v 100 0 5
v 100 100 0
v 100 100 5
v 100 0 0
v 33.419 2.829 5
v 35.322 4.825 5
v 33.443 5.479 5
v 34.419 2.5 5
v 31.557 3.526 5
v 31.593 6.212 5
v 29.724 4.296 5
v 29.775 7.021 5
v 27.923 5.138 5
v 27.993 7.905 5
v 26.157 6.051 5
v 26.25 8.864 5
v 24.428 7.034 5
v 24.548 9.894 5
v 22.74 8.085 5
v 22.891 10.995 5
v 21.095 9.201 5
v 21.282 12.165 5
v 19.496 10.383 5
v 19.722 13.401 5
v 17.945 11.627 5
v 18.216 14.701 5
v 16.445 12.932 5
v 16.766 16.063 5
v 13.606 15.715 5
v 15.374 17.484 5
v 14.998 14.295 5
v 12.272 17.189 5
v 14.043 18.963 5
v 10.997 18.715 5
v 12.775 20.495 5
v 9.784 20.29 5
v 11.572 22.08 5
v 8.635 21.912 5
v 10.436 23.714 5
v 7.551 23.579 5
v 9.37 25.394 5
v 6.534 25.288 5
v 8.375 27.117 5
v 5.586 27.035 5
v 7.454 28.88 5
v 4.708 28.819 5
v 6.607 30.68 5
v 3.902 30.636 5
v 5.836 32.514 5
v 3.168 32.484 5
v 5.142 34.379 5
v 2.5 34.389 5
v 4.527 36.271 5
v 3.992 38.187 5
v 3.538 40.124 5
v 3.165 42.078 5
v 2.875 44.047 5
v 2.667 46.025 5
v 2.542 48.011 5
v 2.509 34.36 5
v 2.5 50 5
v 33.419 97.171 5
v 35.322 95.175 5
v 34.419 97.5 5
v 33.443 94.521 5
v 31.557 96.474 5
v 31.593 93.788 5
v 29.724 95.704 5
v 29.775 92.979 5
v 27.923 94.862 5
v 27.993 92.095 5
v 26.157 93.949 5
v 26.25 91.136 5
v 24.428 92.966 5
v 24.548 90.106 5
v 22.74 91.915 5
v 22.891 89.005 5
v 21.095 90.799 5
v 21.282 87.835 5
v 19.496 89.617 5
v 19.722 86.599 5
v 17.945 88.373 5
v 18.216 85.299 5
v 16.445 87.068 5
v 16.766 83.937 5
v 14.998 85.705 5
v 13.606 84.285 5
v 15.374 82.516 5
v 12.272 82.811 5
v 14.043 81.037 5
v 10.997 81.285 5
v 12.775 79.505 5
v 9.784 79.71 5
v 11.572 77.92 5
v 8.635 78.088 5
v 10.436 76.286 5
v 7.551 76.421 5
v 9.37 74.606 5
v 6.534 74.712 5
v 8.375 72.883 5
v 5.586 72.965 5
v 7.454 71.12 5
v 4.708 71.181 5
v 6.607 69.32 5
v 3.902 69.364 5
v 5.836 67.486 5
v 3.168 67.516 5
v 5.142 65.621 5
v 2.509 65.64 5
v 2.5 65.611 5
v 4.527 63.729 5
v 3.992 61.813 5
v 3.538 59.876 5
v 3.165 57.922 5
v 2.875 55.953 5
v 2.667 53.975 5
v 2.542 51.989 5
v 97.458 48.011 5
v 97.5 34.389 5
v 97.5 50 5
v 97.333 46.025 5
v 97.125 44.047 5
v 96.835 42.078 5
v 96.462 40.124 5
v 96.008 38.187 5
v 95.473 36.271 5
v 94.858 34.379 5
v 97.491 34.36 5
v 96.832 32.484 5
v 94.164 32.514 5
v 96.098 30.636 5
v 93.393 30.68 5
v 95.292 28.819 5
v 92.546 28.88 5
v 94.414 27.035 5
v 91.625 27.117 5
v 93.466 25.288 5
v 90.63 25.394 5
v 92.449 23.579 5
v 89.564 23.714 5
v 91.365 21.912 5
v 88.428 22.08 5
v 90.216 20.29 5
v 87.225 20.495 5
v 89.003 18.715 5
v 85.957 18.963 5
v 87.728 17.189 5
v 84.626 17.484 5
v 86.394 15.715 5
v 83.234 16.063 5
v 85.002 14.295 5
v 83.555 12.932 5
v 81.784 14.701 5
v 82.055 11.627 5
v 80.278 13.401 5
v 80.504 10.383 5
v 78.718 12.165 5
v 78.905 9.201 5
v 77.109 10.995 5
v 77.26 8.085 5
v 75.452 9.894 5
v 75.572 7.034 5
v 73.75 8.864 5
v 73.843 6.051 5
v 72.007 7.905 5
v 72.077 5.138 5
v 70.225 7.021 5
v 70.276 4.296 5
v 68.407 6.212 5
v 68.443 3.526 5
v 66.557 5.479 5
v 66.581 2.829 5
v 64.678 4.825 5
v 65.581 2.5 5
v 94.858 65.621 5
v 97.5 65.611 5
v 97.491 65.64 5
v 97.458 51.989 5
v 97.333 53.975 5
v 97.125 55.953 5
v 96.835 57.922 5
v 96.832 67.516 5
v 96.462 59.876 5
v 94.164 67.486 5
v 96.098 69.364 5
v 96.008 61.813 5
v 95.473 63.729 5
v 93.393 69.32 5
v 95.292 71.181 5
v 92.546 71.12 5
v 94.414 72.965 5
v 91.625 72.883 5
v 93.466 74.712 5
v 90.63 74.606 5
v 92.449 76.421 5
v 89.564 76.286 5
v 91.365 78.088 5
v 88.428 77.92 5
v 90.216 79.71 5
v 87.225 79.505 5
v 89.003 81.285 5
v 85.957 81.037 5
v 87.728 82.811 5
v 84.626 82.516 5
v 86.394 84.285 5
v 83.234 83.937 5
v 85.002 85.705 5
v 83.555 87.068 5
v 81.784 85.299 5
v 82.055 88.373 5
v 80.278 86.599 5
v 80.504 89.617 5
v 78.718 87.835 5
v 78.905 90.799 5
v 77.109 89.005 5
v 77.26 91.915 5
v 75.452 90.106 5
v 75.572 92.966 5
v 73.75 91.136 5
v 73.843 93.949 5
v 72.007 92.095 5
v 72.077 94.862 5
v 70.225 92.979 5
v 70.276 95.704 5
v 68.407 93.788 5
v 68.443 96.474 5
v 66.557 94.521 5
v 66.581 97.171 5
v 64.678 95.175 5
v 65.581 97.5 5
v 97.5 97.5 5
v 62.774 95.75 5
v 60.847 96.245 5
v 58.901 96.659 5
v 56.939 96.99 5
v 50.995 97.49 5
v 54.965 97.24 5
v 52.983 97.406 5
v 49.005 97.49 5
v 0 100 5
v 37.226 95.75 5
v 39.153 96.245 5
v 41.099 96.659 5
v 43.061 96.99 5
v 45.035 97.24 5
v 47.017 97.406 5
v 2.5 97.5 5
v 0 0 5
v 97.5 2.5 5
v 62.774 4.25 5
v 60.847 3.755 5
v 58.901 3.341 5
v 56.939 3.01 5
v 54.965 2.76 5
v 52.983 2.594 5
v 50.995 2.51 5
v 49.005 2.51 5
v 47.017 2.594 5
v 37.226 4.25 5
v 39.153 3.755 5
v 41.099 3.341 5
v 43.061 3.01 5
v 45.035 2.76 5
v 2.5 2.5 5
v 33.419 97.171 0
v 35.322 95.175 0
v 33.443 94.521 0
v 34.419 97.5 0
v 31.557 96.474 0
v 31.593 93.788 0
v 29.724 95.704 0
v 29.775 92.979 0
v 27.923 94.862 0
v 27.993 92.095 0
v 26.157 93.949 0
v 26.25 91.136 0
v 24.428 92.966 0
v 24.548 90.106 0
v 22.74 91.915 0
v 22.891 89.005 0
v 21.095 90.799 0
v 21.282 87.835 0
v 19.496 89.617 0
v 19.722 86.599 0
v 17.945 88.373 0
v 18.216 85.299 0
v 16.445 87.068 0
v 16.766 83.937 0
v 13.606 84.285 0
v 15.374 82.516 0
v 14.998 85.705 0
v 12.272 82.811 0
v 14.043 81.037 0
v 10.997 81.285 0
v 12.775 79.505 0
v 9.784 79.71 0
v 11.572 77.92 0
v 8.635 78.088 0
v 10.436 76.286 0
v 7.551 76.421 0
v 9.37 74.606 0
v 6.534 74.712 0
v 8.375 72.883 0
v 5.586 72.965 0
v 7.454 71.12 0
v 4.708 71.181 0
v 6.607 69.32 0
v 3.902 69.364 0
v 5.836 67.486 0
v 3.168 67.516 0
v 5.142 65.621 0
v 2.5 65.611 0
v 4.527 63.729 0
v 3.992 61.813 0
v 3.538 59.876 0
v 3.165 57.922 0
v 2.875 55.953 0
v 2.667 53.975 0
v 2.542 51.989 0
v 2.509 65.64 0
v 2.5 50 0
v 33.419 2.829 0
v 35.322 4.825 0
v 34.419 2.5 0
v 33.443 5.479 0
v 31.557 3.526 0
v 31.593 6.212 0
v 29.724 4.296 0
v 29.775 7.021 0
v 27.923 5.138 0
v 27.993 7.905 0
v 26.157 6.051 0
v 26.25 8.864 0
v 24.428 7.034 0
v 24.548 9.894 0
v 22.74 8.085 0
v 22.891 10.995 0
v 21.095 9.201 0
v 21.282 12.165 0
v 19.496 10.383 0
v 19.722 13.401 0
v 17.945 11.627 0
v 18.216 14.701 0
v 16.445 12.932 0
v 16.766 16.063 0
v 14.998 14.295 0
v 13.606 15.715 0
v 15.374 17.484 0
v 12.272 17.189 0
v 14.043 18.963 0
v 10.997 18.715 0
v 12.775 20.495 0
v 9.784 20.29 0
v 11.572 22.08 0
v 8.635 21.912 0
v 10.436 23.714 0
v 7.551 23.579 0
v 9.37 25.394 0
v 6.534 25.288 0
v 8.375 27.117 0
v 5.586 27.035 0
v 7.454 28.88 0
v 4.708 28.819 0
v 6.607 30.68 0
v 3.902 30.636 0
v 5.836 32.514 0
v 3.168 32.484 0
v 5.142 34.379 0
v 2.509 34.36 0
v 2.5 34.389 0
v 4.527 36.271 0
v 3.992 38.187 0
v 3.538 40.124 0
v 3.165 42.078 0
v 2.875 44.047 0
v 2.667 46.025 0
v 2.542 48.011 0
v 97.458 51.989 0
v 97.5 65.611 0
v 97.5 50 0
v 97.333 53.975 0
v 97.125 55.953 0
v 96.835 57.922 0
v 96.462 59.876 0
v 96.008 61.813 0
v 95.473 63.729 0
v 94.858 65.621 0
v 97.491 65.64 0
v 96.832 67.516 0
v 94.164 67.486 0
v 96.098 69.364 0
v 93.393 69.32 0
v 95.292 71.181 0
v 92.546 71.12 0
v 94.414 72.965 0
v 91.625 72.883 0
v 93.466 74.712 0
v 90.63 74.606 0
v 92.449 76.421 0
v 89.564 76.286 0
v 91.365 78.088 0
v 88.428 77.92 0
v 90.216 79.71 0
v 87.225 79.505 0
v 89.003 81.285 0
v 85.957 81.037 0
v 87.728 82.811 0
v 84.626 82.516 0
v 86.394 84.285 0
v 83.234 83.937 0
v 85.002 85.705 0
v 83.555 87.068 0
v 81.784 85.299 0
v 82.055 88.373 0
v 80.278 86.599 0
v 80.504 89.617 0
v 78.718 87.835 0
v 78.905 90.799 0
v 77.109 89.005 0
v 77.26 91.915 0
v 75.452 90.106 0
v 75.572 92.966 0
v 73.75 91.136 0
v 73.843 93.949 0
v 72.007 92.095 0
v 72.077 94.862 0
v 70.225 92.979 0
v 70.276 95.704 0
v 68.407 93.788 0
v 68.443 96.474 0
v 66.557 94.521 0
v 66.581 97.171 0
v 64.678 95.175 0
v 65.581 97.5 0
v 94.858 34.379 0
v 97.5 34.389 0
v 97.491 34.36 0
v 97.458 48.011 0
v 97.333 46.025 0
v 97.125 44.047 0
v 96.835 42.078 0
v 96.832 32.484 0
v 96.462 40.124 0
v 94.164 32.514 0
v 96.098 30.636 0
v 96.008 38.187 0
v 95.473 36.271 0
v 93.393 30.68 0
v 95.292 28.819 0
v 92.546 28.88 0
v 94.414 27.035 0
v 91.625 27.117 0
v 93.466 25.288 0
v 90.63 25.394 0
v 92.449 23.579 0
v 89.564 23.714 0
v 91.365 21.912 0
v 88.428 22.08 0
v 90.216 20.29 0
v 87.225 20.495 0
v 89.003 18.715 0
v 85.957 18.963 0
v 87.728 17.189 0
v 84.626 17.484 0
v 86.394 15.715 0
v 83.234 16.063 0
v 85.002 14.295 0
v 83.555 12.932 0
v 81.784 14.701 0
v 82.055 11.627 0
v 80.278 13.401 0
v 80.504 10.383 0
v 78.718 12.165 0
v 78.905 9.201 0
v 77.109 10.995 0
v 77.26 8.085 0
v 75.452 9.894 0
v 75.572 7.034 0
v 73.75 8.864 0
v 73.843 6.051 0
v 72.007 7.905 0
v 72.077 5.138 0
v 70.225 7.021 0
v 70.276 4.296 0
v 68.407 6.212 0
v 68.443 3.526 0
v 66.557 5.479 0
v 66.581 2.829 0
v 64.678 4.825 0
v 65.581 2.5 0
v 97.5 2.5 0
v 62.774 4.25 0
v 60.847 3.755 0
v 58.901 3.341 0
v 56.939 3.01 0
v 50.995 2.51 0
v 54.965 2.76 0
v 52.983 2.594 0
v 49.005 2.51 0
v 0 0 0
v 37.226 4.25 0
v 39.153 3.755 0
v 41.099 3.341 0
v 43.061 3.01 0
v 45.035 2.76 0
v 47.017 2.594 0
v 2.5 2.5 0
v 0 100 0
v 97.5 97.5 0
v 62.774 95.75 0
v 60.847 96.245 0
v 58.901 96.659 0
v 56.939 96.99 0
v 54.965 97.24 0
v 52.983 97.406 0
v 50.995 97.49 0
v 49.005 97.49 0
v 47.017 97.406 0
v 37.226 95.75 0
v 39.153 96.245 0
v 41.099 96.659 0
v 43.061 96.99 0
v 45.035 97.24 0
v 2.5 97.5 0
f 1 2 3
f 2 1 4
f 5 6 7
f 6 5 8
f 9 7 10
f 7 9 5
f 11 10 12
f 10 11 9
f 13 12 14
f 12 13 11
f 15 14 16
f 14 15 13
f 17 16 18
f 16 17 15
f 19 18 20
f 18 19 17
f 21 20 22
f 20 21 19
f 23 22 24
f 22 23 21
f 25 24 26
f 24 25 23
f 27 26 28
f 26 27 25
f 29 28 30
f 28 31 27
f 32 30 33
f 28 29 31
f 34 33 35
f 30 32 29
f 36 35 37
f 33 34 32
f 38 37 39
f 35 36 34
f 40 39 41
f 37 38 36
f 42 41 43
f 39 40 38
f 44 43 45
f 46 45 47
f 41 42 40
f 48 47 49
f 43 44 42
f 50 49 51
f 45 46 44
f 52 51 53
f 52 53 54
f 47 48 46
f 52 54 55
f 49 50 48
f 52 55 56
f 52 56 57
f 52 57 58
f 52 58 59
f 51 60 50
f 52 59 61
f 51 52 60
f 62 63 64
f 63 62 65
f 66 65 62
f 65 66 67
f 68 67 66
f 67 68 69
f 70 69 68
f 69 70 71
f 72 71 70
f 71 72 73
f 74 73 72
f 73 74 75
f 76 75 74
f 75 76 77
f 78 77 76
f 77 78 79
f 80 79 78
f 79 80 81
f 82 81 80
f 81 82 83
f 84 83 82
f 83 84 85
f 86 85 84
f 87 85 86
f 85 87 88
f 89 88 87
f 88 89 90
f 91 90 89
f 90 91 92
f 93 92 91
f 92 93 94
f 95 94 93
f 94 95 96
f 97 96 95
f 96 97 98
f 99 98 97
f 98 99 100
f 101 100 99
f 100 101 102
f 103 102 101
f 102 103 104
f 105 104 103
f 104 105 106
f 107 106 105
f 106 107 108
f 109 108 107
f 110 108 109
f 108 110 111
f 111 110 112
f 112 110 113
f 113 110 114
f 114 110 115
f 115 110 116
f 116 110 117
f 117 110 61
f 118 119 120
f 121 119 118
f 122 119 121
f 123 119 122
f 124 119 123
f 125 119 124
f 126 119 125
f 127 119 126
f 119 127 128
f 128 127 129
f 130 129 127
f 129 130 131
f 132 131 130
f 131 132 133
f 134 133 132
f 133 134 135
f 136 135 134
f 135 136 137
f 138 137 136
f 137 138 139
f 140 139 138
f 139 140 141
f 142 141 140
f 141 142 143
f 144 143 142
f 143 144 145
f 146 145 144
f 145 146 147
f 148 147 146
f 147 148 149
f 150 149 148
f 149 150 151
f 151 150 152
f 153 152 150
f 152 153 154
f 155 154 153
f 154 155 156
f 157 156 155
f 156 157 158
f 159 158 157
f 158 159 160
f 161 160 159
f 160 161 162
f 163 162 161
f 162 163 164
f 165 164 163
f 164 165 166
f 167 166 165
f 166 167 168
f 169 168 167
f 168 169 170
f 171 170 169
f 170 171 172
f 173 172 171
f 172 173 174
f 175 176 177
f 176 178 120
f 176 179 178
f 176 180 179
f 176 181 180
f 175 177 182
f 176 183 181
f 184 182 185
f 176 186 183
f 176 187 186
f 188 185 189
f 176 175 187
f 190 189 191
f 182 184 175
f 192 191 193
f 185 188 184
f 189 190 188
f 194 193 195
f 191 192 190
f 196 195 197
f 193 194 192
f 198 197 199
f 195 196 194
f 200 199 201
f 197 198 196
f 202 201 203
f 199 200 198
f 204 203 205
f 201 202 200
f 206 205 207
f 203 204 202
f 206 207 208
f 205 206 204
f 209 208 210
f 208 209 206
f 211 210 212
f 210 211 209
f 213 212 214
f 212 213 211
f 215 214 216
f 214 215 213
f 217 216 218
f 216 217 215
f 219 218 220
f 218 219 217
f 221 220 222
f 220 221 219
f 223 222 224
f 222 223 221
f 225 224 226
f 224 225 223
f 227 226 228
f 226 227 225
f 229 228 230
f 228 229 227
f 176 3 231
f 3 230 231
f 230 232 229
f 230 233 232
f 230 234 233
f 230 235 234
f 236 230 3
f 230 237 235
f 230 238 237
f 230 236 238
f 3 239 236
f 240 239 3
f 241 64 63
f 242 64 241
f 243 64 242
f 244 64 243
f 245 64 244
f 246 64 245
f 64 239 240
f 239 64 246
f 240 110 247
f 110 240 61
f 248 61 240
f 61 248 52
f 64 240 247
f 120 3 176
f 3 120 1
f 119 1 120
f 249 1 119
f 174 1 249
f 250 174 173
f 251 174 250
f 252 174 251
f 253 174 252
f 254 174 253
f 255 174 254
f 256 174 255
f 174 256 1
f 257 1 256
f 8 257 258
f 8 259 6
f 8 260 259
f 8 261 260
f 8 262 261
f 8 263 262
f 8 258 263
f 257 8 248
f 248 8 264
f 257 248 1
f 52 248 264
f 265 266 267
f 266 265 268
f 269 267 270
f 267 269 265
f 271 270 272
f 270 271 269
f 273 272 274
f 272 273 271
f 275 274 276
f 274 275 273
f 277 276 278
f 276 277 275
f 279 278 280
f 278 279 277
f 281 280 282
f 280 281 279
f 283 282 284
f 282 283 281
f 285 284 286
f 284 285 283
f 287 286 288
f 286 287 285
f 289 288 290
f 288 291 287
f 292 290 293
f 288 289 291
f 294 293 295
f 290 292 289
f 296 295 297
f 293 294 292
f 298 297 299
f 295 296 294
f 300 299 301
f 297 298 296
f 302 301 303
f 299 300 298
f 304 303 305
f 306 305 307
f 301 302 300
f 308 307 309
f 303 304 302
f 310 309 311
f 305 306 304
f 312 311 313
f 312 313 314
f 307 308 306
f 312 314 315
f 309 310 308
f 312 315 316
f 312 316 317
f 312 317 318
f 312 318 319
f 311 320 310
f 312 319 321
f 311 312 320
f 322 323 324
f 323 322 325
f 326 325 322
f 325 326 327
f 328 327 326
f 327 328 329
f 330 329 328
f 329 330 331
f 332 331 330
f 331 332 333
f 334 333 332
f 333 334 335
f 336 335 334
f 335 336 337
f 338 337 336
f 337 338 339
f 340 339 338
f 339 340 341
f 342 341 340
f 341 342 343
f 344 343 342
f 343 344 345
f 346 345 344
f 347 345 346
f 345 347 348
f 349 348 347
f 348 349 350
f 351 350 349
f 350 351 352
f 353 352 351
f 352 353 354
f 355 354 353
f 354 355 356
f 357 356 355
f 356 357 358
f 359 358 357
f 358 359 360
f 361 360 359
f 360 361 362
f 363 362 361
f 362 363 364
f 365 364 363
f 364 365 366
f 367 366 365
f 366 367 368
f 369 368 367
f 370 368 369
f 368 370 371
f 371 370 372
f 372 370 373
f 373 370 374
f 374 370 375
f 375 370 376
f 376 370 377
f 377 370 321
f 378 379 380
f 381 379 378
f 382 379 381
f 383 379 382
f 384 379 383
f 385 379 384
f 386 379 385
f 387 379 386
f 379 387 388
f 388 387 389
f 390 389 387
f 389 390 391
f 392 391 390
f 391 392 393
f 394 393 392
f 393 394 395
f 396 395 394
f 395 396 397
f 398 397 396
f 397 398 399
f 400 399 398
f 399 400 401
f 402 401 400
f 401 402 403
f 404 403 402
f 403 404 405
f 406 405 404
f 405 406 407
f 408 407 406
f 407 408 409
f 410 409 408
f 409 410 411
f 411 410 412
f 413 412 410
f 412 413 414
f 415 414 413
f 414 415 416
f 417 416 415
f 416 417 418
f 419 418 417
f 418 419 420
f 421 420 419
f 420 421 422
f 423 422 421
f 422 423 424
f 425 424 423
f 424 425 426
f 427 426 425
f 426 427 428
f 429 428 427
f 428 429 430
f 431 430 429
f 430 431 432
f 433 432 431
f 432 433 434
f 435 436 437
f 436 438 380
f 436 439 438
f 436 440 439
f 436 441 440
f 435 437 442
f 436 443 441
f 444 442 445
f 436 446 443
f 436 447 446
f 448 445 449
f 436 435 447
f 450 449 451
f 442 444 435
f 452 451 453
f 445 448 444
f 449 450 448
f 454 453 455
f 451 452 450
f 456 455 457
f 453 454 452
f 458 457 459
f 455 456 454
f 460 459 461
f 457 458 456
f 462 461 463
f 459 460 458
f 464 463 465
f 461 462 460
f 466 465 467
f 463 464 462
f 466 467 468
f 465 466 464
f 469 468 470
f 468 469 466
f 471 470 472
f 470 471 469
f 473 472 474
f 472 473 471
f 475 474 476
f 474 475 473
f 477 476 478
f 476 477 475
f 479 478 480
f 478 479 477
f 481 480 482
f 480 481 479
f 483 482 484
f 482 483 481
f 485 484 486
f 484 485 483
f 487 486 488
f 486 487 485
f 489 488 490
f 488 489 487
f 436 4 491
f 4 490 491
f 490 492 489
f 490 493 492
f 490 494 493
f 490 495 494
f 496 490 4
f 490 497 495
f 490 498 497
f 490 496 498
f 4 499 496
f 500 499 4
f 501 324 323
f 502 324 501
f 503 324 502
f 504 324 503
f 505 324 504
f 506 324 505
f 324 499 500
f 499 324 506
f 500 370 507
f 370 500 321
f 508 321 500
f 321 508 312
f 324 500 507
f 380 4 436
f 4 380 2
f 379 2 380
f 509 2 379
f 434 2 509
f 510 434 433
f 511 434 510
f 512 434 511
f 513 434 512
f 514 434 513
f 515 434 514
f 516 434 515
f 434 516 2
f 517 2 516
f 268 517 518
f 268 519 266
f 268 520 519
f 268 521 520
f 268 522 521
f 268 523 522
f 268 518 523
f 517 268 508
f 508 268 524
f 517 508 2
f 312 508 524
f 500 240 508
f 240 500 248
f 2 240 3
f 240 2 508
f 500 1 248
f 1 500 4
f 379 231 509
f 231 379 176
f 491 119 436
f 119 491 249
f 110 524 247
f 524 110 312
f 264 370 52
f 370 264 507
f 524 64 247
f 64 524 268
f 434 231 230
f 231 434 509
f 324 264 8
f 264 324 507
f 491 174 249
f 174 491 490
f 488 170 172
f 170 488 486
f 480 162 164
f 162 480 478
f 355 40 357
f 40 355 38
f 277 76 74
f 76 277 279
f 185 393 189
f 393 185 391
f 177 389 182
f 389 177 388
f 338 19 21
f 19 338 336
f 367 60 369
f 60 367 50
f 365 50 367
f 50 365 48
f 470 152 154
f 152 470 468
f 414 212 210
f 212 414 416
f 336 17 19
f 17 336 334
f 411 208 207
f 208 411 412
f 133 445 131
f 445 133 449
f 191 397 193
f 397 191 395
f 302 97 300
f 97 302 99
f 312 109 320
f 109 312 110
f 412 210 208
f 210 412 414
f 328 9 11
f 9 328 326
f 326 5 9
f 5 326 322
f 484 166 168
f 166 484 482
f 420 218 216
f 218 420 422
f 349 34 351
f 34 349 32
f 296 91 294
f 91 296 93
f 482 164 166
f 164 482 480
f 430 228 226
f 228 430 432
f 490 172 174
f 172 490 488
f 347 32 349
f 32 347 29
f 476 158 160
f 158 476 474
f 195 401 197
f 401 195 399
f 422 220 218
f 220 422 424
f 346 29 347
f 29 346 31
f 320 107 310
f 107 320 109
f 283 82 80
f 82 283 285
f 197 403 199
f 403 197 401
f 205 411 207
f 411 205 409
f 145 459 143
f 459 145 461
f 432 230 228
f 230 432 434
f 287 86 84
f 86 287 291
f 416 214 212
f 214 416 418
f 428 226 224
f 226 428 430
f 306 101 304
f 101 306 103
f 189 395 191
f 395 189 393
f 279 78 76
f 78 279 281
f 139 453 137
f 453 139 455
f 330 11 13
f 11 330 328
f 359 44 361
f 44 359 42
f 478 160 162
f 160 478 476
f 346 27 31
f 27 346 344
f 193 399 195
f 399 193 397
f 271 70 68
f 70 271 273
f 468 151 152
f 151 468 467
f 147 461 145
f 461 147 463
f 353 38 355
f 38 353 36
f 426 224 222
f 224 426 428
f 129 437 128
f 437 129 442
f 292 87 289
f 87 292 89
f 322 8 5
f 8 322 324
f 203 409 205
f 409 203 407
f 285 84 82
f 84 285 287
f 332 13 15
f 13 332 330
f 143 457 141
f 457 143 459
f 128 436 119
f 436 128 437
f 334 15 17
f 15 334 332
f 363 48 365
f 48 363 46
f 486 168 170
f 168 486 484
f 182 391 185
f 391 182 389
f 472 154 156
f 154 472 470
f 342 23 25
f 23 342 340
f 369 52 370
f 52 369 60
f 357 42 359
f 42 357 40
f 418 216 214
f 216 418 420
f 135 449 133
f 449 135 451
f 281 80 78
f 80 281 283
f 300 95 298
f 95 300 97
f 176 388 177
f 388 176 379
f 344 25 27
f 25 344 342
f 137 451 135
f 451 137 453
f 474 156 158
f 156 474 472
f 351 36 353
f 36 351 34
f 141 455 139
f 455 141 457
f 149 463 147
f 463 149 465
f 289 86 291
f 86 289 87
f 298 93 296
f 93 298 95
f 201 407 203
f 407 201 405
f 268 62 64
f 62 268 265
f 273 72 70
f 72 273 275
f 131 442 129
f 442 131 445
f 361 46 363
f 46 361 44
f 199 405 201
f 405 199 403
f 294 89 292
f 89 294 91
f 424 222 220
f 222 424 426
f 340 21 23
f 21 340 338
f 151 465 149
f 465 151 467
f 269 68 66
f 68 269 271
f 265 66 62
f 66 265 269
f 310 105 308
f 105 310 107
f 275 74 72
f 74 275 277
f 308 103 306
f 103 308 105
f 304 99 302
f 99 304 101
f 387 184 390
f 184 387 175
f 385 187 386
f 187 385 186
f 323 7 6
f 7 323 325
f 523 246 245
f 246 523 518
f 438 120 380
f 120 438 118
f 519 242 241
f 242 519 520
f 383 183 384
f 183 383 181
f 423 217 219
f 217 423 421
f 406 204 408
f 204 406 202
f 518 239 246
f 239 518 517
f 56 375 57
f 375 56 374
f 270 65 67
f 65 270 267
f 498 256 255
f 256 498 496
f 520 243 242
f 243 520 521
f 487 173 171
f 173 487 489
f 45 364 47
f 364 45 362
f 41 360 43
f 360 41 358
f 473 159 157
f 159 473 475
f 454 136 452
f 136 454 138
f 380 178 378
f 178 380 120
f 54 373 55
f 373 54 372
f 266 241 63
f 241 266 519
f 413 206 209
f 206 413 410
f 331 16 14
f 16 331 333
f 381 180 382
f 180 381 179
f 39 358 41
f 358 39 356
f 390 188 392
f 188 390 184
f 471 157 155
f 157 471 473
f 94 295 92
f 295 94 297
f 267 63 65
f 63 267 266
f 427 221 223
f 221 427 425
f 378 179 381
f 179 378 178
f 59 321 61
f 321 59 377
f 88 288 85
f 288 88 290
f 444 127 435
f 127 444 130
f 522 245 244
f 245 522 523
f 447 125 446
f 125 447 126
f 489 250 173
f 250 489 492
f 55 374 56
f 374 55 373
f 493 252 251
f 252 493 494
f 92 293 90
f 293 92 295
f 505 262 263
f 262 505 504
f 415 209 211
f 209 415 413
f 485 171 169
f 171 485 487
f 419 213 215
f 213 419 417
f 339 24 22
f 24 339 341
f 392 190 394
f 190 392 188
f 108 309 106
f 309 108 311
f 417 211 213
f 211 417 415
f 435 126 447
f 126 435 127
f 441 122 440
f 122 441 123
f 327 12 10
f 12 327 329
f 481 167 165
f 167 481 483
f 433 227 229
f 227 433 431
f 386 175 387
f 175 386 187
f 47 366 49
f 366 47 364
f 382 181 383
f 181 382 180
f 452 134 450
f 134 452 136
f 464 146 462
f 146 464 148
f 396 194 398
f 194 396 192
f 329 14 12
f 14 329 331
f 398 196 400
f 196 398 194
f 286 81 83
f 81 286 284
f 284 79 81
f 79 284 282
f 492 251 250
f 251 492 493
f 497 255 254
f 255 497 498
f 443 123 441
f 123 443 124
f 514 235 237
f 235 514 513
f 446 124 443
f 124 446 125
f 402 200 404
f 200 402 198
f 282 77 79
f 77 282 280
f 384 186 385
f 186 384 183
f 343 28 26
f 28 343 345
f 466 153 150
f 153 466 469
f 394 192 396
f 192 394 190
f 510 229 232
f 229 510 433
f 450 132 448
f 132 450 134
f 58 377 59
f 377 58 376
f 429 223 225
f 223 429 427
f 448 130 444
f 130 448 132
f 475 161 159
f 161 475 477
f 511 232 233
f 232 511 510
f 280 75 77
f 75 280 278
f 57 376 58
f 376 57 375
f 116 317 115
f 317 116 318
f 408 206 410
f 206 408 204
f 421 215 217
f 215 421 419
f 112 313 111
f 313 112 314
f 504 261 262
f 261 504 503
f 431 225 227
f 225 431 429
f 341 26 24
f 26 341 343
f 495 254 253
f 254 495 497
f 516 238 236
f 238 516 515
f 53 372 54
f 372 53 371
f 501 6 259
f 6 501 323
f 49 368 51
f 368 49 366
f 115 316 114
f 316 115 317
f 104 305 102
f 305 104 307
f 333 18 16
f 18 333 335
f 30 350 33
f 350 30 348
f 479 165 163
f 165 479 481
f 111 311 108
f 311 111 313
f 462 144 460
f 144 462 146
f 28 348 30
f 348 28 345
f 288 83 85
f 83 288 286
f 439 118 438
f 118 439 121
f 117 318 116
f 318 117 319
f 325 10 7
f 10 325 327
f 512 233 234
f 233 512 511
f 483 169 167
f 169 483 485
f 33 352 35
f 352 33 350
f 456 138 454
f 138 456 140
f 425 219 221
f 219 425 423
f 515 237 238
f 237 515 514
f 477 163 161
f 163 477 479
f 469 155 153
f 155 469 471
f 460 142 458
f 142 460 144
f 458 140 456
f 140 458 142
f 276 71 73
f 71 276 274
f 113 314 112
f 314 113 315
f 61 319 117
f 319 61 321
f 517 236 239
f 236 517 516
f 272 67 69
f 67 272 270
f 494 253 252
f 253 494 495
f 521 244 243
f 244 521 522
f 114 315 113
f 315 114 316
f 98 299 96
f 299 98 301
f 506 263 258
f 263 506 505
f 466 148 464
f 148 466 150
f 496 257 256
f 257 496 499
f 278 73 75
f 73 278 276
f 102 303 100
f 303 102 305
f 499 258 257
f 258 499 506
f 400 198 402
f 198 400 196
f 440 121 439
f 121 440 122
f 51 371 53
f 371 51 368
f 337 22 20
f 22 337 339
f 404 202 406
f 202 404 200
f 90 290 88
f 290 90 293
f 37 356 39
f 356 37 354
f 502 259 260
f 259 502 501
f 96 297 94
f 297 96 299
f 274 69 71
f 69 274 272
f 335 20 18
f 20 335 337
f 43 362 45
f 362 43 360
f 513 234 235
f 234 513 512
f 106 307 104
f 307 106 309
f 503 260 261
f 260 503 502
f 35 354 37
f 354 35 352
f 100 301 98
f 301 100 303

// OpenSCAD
// [FL_INDEX: keywords="openscad, 3d_parametric, Square_and_Circle, csg_solid" | COT="Parametric OpenSCAD design from 3DCodeverse"]
// Title: Square and Circle 

$fa = 0.01;
size = 100;
height= 5;
thick = 5;
union() {
difference() 
{
    cube([size,size,height]);    
    translate([thick / 2.0,thick/2.0,-10])cube([size-thick,size-thick,height+50]);        
}
difference() {
translate([size/2.0,size/2.0,0])cylinder(height,size/2.0,size/2.0);
translate([size/2.0,size/2.0,-10])cylinder(height+20,size/2.0 - thick/2.0,size/2.0 - thick/2.0);
}
};
